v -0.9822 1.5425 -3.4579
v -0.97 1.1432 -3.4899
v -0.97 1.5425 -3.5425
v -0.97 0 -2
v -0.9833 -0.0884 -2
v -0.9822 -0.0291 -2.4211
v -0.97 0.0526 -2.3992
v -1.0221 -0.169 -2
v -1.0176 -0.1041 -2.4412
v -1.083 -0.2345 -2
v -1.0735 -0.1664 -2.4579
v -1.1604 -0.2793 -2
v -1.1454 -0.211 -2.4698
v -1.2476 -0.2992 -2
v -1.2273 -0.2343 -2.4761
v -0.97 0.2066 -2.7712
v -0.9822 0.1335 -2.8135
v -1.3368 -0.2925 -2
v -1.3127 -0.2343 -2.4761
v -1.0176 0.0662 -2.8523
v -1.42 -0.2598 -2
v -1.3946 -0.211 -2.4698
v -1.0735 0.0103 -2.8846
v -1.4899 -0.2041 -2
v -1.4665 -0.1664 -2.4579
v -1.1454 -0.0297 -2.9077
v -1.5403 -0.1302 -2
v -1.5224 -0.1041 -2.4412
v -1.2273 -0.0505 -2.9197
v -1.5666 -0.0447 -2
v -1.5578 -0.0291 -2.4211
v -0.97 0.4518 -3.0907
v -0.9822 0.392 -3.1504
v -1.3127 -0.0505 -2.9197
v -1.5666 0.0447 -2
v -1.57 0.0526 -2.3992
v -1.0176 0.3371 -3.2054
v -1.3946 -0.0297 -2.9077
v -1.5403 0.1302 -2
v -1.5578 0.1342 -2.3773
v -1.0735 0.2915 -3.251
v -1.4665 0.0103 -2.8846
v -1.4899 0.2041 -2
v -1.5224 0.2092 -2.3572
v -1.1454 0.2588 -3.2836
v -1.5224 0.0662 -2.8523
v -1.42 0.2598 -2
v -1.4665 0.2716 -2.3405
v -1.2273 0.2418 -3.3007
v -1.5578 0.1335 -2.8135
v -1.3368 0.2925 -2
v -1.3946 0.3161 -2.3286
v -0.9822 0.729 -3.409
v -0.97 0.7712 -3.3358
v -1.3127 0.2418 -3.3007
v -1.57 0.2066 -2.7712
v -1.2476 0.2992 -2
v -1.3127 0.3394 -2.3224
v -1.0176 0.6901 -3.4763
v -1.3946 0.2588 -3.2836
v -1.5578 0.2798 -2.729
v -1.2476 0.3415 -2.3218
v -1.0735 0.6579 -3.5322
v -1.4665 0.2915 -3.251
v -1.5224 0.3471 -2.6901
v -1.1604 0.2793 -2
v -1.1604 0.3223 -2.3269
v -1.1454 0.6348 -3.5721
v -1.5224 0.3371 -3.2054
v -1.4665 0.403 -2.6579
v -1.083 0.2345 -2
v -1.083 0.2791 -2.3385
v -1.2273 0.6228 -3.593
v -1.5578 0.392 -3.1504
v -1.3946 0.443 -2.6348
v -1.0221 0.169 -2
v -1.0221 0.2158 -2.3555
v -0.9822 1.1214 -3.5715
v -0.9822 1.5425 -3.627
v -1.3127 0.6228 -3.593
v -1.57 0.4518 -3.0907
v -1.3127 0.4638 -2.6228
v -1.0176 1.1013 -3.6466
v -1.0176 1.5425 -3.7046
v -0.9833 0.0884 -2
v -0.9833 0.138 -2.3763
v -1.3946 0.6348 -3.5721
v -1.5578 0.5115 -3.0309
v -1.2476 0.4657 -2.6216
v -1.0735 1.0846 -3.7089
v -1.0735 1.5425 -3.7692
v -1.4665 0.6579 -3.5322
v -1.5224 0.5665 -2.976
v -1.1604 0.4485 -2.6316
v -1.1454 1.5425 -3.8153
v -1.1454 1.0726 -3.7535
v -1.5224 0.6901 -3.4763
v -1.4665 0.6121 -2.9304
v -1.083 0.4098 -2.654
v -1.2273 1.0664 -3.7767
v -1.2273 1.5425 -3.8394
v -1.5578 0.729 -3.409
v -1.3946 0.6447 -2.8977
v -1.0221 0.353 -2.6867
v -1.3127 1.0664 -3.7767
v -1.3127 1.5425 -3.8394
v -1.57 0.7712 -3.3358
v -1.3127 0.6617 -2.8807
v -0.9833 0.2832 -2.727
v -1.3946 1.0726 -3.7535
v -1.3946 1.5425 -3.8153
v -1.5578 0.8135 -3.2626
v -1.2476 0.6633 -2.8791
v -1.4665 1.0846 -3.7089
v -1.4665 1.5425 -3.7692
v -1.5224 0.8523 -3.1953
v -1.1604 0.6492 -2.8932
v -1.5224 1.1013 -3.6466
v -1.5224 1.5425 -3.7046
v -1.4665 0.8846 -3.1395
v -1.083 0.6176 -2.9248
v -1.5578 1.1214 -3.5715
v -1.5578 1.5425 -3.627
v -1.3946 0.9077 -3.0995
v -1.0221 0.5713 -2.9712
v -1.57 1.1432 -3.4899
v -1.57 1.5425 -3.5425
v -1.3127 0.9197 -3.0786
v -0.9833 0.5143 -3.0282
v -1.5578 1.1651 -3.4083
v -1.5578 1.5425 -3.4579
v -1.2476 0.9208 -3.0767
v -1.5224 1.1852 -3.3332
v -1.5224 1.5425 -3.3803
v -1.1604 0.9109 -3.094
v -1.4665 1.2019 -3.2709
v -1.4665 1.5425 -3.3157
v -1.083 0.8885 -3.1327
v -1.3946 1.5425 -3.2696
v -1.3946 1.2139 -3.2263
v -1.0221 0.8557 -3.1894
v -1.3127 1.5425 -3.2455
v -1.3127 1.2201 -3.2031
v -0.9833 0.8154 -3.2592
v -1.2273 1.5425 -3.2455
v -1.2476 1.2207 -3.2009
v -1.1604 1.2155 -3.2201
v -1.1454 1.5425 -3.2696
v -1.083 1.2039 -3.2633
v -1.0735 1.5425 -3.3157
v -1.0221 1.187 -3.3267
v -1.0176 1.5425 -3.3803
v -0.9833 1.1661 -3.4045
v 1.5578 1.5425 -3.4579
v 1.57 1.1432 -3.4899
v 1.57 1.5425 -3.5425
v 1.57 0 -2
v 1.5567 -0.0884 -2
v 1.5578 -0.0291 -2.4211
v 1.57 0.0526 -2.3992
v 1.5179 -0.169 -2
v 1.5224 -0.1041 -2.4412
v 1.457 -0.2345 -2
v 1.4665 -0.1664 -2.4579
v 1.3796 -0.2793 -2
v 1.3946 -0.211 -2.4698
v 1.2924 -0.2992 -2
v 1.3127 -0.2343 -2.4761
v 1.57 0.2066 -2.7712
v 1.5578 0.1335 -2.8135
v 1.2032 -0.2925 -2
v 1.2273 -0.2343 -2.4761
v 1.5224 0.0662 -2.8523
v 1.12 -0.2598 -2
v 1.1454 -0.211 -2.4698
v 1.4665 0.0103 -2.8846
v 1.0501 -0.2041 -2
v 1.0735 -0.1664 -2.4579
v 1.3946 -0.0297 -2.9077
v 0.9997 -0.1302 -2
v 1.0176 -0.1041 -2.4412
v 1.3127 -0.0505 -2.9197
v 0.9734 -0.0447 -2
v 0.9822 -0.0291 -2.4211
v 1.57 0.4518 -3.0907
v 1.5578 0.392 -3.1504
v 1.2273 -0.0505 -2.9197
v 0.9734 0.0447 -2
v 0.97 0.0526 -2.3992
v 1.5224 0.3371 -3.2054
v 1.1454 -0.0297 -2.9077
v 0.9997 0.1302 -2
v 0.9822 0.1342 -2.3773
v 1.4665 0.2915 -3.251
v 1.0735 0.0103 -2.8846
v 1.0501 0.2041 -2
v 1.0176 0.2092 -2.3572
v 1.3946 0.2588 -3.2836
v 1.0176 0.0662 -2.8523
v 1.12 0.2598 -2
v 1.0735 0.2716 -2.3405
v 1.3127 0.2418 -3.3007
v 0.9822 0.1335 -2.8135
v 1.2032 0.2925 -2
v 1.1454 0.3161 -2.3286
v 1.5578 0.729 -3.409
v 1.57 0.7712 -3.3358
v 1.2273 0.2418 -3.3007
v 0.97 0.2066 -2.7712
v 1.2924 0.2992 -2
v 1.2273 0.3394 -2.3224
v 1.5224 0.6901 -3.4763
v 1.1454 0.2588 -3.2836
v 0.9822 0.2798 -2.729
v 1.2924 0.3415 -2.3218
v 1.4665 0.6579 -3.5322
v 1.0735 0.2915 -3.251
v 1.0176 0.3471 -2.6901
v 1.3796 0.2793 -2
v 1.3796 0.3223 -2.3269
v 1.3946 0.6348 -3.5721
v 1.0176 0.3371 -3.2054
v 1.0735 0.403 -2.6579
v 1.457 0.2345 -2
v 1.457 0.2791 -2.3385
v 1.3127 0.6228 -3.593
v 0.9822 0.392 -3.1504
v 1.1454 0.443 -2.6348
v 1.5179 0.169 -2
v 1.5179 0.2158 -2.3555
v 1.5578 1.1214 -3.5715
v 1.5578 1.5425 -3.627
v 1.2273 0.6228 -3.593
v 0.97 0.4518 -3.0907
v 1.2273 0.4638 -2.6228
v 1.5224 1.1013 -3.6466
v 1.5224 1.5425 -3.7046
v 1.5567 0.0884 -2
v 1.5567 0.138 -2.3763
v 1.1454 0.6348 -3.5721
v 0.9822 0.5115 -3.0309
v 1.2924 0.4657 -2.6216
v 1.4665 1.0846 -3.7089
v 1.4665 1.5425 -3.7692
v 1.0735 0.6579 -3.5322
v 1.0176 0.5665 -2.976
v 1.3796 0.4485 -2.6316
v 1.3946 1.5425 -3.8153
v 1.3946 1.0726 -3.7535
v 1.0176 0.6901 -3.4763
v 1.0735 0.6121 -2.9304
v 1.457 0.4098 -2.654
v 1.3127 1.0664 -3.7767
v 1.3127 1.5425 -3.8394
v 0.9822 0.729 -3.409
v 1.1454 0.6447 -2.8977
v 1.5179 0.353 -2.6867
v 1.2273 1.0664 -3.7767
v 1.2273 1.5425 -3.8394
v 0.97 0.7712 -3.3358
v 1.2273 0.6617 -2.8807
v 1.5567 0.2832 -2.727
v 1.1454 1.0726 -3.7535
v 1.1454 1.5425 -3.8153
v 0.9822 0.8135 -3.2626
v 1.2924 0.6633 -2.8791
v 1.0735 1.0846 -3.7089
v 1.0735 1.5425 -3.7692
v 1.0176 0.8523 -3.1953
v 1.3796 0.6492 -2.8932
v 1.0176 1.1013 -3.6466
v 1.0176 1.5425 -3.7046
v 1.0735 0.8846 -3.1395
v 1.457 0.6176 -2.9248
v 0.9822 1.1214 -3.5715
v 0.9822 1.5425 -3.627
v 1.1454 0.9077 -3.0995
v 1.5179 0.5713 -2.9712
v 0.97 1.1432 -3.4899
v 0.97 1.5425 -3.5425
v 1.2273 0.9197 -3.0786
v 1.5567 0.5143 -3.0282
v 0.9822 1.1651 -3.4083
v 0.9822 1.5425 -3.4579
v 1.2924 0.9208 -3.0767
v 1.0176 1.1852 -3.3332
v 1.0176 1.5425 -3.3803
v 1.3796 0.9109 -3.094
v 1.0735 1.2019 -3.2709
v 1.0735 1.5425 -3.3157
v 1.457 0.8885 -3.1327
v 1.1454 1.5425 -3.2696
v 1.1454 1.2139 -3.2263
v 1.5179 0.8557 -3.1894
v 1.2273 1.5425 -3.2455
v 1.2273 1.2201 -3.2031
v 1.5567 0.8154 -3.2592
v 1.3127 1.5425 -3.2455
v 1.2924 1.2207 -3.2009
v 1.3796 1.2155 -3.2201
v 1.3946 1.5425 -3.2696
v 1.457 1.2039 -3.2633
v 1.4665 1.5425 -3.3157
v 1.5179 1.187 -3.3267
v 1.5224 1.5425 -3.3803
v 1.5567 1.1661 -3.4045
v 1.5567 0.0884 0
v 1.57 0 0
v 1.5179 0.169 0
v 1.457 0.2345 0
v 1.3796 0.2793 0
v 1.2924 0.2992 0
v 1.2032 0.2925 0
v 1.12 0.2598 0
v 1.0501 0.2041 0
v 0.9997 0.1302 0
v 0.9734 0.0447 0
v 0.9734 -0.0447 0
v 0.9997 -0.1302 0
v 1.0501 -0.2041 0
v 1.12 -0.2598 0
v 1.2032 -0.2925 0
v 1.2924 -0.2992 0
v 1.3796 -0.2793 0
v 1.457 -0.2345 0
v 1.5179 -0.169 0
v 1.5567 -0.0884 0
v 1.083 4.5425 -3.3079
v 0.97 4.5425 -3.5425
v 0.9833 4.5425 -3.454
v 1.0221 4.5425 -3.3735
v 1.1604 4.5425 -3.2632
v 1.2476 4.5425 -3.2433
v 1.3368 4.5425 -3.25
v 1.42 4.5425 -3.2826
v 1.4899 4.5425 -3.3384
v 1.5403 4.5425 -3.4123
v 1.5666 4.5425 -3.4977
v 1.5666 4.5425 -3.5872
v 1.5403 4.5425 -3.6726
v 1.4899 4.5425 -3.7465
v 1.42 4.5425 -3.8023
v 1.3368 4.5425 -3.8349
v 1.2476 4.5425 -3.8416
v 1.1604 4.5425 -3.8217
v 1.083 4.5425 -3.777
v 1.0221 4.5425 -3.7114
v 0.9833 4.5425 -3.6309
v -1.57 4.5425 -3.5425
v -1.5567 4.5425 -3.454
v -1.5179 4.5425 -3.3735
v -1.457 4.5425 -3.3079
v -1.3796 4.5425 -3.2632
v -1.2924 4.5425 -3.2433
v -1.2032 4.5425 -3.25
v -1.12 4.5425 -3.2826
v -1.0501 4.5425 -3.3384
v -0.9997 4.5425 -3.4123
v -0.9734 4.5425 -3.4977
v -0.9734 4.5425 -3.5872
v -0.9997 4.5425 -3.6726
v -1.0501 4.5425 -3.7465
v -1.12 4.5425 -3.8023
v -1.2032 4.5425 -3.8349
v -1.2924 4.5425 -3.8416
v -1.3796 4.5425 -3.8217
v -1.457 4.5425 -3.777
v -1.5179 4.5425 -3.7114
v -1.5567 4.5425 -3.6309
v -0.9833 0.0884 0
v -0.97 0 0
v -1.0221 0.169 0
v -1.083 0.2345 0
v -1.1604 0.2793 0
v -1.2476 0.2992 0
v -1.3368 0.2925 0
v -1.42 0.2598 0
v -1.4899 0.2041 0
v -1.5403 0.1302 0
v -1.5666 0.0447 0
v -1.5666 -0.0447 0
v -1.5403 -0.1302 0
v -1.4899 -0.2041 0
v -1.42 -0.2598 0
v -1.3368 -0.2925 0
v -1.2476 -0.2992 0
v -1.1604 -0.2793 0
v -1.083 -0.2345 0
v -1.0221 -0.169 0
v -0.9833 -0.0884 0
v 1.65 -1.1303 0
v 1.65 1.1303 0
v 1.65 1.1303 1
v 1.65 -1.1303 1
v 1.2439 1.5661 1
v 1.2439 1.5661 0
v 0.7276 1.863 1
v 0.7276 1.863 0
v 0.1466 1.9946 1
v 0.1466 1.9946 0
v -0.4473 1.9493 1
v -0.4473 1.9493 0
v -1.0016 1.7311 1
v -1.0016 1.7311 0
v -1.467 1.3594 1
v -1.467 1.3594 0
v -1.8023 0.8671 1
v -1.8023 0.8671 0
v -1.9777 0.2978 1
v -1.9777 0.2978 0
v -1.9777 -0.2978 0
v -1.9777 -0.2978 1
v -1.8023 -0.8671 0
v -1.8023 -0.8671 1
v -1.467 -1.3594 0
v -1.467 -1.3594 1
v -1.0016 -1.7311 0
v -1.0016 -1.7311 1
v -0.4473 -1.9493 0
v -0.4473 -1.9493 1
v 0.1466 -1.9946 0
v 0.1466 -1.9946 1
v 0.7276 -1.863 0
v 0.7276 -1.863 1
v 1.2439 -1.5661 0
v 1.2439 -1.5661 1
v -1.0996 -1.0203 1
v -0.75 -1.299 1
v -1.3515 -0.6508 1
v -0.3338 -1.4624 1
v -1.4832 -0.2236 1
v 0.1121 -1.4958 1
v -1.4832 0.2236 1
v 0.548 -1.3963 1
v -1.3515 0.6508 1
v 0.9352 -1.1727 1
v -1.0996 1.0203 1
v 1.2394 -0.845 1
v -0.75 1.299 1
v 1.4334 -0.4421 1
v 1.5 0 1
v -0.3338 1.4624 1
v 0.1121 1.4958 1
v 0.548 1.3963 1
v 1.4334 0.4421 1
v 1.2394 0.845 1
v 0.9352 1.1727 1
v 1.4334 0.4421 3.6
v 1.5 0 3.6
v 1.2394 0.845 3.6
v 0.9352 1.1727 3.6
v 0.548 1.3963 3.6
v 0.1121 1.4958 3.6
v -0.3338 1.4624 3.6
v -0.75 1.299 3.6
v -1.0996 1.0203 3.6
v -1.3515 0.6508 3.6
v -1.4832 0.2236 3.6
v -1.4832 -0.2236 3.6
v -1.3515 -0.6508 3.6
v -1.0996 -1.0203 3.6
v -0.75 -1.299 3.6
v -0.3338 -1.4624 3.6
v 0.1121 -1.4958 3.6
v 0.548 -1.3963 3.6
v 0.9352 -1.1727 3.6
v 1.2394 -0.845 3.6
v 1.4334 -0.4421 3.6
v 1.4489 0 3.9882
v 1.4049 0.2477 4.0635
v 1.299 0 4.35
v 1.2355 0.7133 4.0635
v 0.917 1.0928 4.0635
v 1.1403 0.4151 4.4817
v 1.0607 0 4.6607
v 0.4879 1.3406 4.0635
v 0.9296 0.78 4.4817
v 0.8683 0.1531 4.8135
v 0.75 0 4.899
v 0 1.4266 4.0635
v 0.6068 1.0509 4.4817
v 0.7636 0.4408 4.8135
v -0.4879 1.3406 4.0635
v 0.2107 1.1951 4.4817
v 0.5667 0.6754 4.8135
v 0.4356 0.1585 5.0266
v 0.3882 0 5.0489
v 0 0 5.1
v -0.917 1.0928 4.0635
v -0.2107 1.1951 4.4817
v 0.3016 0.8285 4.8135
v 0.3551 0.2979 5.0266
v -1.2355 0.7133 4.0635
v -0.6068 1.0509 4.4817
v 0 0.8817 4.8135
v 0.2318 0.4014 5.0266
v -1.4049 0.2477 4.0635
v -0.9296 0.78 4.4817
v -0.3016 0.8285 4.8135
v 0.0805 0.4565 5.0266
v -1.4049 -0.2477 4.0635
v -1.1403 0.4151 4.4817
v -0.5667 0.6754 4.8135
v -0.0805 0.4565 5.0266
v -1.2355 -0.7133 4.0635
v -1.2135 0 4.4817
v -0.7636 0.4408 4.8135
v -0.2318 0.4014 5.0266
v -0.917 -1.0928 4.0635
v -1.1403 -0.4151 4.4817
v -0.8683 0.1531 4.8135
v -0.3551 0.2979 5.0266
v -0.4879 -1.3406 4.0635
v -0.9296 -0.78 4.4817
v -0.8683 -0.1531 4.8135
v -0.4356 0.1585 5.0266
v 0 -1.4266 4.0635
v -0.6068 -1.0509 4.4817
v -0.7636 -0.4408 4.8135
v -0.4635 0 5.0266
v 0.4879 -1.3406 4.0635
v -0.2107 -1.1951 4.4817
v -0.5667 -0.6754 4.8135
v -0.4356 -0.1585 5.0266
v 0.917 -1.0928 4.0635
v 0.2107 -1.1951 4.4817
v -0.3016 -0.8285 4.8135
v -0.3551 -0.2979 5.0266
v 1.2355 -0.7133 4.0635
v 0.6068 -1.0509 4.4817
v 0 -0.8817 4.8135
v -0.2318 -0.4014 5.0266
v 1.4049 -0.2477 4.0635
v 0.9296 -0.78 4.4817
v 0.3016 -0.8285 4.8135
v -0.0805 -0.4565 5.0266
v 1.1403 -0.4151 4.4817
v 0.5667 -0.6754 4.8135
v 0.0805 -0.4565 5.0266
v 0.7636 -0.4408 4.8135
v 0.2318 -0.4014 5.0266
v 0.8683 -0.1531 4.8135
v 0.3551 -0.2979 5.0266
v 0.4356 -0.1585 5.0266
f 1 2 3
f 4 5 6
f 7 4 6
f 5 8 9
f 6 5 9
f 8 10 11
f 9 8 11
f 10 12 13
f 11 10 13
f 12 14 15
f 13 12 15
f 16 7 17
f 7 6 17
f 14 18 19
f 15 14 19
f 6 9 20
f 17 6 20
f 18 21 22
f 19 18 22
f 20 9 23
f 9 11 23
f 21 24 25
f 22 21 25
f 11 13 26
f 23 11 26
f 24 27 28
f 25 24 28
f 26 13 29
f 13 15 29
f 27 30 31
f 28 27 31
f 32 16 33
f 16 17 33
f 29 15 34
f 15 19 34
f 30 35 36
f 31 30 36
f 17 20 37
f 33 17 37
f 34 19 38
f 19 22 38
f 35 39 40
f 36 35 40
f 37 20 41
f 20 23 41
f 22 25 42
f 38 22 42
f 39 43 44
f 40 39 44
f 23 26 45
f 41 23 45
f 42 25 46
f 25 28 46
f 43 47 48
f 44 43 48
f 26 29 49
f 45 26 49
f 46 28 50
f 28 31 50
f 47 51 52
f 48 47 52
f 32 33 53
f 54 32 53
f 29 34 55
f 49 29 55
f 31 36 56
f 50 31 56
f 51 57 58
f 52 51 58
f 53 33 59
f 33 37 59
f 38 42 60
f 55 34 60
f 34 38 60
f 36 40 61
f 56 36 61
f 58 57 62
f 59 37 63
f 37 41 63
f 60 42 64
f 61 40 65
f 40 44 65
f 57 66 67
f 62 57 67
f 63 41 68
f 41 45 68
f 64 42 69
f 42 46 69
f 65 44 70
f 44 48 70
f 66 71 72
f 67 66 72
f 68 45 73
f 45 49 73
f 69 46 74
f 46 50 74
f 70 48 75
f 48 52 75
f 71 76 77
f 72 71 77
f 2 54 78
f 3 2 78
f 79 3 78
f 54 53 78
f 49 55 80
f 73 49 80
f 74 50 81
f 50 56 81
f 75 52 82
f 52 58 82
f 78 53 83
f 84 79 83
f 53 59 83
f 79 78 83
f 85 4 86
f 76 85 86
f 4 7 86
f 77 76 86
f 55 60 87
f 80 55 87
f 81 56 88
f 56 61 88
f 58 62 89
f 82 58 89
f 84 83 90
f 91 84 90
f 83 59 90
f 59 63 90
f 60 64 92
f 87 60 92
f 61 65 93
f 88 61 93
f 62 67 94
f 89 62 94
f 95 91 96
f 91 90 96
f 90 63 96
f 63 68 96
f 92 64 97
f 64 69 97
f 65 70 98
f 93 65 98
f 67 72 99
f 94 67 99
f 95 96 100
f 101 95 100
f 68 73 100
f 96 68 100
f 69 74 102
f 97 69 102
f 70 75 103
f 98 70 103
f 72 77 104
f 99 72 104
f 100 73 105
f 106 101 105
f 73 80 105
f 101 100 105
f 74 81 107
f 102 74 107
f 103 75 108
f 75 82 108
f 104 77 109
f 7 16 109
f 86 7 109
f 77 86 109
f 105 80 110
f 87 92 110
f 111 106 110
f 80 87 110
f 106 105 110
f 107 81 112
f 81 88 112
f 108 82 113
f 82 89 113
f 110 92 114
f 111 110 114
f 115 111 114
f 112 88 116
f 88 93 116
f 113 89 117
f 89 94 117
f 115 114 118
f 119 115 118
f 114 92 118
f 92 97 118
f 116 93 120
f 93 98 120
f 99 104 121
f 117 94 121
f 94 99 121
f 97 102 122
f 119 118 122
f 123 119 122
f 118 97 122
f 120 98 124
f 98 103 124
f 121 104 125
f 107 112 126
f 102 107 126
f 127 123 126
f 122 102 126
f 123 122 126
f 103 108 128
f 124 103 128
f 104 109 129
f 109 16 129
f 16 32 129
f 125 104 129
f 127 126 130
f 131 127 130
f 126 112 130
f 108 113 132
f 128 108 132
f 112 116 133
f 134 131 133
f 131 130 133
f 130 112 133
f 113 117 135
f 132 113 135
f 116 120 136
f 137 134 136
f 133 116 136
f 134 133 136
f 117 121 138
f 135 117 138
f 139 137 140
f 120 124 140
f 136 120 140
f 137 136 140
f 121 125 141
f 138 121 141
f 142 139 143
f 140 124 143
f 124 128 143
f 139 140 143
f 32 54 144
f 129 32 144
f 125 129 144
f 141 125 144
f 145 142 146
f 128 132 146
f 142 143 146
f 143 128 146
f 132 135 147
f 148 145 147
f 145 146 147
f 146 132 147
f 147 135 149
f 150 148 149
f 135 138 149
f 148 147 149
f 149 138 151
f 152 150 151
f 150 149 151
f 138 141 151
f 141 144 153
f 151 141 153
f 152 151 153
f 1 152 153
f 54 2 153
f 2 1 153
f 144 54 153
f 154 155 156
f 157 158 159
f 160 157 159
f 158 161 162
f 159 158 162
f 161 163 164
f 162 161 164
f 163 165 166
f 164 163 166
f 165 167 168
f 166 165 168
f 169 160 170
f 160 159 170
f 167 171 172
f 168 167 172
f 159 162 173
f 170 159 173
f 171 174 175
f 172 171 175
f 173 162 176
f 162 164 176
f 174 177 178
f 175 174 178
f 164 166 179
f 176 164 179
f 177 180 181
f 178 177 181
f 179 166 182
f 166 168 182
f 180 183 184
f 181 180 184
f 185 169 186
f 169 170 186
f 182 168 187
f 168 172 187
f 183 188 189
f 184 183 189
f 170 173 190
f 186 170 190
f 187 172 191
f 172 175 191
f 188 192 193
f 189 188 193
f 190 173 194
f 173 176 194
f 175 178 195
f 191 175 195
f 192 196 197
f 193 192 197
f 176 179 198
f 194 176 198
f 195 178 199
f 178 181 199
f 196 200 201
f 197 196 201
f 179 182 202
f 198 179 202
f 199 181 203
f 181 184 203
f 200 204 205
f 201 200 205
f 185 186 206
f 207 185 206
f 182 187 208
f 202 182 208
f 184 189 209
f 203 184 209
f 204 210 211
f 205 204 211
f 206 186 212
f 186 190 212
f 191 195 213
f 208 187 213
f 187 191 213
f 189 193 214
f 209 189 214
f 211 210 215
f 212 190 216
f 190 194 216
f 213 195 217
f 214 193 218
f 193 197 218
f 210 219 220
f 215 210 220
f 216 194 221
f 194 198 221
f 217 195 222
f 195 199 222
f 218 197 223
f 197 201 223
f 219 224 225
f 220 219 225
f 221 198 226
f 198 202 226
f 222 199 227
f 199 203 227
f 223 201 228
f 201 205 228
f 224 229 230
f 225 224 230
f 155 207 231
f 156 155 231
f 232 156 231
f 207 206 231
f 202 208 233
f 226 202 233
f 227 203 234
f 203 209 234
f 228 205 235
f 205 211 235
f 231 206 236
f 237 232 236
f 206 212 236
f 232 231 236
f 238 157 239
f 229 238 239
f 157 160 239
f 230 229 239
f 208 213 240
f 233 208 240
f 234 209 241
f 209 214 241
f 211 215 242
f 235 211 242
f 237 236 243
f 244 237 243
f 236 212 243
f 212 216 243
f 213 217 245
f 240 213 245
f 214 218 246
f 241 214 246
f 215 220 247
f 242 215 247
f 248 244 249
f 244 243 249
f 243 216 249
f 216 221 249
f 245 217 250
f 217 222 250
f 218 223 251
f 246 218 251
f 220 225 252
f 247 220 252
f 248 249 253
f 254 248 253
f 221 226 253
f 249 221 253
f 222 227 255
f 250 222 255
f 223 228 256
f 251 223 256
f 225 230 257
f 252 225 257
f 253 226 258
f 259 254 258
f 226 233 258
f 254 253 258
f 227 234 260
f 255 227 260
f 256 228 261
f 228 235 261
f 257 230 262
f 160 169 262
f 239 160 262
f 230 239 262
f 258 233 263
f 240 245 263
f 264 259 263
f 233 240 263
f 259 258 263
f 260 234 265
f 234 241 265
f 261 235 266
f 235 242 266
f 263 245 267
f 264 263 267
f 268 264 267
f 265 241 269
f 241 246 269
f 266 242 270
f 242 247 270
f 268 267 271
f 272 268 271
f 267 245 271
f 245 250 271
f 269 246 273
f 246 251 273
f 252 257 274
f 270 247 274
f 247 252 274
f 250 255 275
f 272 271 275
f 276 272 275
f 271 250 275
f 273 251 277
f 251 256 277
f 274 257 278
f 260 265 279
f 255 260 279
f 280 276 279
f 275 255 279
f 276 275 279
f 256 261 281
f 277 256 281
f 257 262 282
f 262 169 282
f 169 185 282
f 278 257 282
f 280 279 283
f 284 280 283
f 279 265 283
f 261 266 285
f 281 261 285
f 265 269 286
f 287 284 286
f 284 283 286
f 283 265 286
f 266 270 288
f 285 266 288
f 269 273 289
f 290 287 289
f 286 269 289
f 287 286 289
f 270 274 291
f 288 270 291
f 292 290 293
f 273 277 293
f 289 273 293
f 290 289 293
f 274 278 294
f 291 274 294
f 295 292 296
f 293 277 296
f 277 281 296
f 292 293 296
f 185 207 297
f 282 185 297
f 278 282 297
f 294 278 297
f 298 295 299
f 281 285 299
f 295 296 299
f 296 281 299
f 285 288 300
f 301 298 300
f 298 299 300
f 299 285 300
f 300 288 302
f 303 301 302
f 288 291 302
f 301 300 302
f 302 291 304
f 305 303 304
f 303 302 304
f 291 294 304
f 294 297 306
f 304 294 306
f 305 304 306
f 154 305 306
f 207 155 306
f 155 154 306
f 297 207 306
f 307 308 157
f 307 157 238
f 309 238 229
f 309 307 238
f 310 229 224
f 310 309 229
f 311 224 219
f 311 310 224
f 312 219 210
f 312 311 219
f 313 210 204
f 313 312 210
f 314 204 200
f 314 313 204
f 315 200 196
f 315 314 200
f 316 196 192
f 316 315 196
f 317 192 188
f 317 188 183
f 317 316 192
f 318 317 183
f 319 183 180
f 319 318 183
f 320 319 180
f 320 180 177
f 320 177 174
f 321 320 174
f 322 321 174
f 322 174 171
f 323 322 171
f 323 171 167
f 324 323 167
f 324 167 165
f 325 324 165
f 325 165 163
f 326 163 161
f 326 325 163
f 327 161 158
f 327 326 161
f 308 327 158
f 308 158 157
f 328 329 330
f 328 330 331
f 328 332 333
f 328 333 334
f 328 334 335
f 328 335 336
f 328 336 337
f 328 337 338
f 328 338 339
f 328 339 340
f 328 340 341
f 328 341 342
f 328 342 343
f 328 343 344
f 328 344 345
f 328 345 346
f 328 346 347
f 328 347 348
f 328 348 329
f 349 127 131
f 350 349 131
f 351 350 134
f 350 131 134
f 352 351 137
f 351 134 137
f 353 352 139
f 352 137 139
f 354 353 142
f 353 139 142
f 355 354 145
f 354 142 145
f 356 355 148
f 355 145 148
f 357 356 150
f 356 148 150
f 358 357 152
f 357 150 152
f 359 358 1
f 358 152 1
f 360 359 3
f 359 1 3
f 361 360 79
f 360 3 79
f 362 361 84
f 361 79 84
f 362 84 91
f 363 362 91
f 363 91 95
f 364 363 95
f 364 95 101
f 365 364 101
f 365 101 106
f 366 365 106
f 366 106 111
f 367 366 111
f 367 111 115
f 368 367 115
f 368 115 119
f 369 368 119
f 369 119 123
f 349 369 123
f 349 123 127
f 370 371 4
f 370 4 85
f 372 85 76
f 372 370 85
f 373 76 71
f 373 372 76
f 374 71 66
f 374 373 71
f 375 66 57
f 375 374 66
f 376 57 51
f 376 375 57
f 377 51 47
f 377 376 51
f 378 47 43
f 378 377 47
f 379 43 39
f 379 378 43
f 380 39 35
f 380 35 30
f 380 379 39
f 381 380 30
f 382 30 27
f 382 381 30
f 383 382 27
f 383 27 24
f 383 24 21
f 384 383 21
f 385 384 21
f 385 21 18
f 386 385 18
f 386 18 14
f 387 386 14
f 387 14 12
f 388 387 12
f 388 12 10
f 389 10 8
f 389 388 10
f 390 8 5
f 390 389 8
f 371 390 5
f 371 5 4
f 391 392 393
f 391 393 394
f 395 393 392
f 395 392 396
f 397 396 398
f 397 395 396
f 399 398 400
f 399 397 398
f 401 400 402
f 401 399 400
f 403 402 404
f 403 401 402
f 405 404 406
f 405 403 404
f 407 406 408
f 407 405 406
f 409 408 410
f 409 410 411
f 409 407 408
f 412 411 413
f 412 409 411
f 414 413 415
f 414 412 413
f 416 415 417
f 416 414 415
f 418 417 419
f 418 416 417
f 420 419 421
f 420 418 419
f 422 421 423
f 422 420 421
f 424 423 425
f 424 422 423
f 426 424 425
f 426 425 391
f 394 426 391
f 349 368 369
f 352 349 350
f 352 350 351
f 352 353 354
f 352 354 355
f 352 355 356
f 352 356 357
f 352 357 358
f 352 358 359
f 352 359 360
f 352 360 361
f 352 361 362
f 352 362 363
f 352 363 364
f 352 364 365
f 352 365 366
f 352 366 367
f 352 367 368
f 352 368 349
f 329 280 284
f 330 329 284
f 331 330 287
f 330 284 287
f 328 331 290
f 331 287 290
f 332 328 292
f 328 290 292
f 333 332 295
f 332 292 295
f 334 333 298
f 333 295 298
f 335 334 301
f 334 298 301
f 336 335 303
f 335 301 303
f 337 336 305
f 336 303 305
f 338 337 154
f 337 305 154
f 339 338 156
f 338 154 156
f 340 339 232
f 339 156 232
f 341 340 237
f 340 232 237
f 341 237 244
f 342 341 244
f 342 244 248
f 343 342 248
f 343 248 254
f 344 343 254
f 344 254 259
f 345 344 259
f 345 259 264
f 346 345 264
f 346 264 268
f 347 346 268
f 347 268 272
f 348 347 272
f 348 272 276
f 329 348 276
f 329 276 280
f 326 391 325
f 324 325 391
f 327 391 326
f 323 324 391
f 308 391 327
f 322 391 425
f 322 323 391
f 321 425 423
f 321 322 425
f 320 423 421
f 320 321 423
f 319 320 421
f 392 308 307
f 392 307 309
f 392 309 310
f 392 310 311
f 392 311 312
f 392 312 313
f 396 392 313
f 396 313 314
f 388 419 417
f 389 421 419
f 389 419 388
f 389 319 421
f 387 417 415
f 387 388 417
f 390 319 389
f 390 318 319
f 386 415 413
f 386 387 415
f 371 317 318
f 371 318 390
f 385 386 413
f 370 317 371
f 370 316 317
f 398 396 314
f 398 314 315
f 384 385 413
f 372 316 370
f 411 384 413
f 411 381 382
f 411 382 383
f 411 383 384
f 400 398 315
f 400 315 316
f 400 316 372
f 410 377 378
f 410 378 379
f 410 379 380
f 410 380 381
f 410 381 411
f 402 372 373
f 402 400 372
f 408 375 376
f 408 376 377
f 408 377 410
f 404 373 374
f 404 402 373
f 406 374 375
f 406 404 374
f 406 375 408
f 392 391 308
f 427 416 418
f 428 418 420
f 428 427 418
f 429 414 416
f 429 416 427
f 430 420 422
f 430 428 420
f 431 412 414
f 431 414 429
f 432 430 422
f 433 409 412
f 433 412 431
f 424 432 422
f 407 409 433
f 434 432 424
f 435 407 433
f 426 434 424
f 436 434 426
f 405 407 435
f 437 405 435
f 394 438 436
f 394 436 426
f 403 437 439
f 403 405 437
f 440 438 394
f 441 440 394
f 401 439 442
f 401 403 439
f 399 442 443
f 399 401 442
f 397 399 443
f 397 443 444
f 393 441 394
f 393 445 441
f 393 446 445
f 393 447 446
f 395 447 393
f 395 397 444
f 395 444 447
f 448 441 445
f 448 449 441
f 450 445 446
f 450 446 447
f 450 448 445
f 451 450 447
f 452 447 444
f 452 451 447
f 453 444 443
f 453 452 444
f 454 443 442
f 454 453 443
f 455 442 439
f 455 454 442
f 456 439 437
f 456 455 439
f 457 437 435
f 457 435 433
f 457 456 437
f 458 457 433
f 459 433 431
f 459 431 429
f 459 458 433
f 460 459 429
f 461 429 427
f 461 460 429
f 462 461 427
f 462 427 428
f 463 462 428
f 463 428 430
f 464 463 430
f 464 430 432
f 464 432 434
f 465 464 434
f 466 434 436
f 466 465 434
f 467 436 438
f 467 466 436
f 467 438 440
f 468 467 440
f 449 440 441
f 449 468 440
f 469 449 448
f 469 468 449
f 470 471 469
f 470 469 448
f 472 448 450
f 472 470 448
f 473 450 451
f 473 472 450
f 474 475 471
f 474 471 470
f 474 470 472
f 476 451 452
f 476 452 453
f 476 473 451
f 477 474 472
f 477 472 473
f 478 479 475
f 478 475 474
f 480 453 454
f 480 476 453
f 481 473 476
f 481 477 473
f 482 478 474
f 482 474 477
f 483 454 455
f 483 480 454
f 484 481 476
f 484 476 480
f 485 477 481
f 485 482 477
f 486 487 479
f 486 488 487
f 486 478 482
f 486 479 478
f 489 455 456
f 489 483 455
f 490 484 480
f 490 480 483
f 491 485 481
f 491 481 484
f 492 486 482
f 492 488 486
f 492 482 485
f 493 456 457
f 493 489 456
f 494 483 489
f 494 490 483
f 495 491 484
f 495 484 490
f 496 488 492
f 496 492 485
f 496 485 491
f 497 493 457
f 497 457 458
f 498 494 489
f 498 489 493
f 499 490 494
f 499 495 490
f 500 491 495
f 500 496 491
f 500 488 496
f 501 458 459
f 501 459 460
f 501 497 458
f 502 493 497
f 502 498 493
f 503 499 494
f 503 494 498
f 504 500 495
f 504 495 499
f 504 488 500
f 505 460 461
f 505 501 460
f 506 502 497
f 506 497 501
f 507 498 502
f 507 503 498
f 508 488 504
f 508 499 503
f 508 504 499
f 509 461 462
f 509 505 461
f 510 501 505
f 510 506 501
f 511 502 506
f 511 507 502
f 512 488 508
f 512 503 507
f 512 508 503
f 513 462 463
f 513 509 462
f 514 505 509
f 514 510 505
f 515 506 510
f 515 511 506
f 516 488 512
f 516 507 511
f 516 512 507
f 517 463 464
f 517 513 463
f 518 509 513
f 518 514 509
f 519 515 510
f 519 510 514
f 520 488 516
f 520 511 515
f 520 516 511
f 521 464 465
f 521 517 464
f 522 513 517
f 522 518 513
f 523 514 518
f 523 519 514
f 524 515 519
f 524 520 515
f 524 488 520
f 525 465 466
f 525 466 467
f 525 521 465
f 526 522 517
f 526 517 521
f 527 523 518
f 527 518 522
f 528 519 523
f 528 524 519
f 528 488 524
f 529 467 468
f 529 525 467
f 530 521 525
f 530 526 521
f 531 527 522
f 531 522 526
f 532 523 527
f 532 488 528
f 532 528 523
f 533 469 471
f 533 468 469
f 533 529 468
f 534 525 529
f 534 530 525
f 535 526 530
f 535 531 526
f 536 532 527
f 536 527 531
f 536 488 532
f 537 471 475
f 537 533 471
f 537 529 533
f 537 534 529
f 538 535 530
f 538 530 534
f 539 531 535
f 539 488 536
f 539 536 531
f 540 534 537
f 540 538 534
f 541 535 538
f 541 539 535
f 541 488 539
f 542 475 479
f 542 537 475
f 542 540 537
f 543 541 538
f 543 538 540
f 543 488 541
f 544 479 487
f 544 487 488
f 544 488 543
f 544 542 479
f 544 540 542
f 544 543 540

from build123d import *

# Parameters (mm, degrees)
F2_R      = 0.3
F3_DEPTH  = 2
F4_DEPTH  = 25
F5_R      = 0.3
F6_ANGLE  = 90
F6_FACE_R = 0.3
F7_R      = 0.3
F8_DEPTH  = 3


# Not quite as in the source:
# - a feature names something its author has since deleted; it is built from what else it names


with BuildPart() as f1:
    # F0 (on Front) → F1 (revolve)
    with BuildSketch(Plane.XZ):
        with BuildLine():
            Line((0, 3.6), (0, 0))
            Line((0, 0), (1.5, 0))
            Line((1.5, 0), (2, 0))
            Line((2, 0), (2, 1))
            Line((2, 1), (1.5, 1))
            Line((1.5, 1), (1.5, 3.6))
            ThreePointArc((1.5, 3.6), (1.0606601718, 4.6606601718), (0, 5.1))
            Line((0, 5.1), (0, 3.6))
        make_face()
    revolve(axis=Axis((0, 0, 1.8), (0, 0, 1)))

    # F2 (on Top) → F3 (join)
    with BuildSketch(Plane.XY):
        with Locations((-1.27, 0)):
            Circle(F2_R)
        with Locations((1.27, 0)):
            Circle(F2_R)
    extrude(amount=-F3_DEPTH)

    # F2 (on Top) → F4 (cut)
    with BuildSketch(Plane.XY):
        with BuildLine():
            Line((1.65, 1.1302654555), (1.65, 0))
            Line((1.65, 0), (1.65, -1.1302654555))
            ThreePointArc((1.65, -1.1302654555), (1.9104973175, -0.5916079783), (2, 0))
            ThreePointArc((2, 0), (1.9104973175, 0.5916079783), (1.65, 1.1302654555))
        make_face()
    extrude(amount=F4_DEPTH, mode=Mode.SUBTRACT)

    # F5 (on face) → F6 (revolve)
    with BuildSketch(Plane(origin=(0, 0, -2), x_dir=(1, 0, 0), z_dir=(0, 0, -1))):
        with Locations((-1.27, 0)):
            Circle(F5_R)
        with Locations((1.27, 0)):
            Circle(F5_R)
    revolve(axis=Axis((0.0564431539, 1.5424509184, -2), (1, 0, 0)), revolution_arc=F6_ANGLE)

    # F6_face (on face) + F7 (on face) → F8 (join)
    with BuildSketch(Plane(origin=(1.27, 1.5424509184, -3.5424509184), x_dir=(-1, 0, 0), z_dir=(0, 1, 0))):
        with Locations((2.54, 0)):
            Circle(F6_FACE_R)
    with BuildSketch(Plane(origin=(0, 1.5424509184, 0), x_dir=(-1, 0, 0), z_dir=(0, 1, 0))):
        with Locations((-1.27, -3.5424509184)):
            Circle(F7_R)
    extrude(amount=F8_DEPTH)


solid = f1.part
